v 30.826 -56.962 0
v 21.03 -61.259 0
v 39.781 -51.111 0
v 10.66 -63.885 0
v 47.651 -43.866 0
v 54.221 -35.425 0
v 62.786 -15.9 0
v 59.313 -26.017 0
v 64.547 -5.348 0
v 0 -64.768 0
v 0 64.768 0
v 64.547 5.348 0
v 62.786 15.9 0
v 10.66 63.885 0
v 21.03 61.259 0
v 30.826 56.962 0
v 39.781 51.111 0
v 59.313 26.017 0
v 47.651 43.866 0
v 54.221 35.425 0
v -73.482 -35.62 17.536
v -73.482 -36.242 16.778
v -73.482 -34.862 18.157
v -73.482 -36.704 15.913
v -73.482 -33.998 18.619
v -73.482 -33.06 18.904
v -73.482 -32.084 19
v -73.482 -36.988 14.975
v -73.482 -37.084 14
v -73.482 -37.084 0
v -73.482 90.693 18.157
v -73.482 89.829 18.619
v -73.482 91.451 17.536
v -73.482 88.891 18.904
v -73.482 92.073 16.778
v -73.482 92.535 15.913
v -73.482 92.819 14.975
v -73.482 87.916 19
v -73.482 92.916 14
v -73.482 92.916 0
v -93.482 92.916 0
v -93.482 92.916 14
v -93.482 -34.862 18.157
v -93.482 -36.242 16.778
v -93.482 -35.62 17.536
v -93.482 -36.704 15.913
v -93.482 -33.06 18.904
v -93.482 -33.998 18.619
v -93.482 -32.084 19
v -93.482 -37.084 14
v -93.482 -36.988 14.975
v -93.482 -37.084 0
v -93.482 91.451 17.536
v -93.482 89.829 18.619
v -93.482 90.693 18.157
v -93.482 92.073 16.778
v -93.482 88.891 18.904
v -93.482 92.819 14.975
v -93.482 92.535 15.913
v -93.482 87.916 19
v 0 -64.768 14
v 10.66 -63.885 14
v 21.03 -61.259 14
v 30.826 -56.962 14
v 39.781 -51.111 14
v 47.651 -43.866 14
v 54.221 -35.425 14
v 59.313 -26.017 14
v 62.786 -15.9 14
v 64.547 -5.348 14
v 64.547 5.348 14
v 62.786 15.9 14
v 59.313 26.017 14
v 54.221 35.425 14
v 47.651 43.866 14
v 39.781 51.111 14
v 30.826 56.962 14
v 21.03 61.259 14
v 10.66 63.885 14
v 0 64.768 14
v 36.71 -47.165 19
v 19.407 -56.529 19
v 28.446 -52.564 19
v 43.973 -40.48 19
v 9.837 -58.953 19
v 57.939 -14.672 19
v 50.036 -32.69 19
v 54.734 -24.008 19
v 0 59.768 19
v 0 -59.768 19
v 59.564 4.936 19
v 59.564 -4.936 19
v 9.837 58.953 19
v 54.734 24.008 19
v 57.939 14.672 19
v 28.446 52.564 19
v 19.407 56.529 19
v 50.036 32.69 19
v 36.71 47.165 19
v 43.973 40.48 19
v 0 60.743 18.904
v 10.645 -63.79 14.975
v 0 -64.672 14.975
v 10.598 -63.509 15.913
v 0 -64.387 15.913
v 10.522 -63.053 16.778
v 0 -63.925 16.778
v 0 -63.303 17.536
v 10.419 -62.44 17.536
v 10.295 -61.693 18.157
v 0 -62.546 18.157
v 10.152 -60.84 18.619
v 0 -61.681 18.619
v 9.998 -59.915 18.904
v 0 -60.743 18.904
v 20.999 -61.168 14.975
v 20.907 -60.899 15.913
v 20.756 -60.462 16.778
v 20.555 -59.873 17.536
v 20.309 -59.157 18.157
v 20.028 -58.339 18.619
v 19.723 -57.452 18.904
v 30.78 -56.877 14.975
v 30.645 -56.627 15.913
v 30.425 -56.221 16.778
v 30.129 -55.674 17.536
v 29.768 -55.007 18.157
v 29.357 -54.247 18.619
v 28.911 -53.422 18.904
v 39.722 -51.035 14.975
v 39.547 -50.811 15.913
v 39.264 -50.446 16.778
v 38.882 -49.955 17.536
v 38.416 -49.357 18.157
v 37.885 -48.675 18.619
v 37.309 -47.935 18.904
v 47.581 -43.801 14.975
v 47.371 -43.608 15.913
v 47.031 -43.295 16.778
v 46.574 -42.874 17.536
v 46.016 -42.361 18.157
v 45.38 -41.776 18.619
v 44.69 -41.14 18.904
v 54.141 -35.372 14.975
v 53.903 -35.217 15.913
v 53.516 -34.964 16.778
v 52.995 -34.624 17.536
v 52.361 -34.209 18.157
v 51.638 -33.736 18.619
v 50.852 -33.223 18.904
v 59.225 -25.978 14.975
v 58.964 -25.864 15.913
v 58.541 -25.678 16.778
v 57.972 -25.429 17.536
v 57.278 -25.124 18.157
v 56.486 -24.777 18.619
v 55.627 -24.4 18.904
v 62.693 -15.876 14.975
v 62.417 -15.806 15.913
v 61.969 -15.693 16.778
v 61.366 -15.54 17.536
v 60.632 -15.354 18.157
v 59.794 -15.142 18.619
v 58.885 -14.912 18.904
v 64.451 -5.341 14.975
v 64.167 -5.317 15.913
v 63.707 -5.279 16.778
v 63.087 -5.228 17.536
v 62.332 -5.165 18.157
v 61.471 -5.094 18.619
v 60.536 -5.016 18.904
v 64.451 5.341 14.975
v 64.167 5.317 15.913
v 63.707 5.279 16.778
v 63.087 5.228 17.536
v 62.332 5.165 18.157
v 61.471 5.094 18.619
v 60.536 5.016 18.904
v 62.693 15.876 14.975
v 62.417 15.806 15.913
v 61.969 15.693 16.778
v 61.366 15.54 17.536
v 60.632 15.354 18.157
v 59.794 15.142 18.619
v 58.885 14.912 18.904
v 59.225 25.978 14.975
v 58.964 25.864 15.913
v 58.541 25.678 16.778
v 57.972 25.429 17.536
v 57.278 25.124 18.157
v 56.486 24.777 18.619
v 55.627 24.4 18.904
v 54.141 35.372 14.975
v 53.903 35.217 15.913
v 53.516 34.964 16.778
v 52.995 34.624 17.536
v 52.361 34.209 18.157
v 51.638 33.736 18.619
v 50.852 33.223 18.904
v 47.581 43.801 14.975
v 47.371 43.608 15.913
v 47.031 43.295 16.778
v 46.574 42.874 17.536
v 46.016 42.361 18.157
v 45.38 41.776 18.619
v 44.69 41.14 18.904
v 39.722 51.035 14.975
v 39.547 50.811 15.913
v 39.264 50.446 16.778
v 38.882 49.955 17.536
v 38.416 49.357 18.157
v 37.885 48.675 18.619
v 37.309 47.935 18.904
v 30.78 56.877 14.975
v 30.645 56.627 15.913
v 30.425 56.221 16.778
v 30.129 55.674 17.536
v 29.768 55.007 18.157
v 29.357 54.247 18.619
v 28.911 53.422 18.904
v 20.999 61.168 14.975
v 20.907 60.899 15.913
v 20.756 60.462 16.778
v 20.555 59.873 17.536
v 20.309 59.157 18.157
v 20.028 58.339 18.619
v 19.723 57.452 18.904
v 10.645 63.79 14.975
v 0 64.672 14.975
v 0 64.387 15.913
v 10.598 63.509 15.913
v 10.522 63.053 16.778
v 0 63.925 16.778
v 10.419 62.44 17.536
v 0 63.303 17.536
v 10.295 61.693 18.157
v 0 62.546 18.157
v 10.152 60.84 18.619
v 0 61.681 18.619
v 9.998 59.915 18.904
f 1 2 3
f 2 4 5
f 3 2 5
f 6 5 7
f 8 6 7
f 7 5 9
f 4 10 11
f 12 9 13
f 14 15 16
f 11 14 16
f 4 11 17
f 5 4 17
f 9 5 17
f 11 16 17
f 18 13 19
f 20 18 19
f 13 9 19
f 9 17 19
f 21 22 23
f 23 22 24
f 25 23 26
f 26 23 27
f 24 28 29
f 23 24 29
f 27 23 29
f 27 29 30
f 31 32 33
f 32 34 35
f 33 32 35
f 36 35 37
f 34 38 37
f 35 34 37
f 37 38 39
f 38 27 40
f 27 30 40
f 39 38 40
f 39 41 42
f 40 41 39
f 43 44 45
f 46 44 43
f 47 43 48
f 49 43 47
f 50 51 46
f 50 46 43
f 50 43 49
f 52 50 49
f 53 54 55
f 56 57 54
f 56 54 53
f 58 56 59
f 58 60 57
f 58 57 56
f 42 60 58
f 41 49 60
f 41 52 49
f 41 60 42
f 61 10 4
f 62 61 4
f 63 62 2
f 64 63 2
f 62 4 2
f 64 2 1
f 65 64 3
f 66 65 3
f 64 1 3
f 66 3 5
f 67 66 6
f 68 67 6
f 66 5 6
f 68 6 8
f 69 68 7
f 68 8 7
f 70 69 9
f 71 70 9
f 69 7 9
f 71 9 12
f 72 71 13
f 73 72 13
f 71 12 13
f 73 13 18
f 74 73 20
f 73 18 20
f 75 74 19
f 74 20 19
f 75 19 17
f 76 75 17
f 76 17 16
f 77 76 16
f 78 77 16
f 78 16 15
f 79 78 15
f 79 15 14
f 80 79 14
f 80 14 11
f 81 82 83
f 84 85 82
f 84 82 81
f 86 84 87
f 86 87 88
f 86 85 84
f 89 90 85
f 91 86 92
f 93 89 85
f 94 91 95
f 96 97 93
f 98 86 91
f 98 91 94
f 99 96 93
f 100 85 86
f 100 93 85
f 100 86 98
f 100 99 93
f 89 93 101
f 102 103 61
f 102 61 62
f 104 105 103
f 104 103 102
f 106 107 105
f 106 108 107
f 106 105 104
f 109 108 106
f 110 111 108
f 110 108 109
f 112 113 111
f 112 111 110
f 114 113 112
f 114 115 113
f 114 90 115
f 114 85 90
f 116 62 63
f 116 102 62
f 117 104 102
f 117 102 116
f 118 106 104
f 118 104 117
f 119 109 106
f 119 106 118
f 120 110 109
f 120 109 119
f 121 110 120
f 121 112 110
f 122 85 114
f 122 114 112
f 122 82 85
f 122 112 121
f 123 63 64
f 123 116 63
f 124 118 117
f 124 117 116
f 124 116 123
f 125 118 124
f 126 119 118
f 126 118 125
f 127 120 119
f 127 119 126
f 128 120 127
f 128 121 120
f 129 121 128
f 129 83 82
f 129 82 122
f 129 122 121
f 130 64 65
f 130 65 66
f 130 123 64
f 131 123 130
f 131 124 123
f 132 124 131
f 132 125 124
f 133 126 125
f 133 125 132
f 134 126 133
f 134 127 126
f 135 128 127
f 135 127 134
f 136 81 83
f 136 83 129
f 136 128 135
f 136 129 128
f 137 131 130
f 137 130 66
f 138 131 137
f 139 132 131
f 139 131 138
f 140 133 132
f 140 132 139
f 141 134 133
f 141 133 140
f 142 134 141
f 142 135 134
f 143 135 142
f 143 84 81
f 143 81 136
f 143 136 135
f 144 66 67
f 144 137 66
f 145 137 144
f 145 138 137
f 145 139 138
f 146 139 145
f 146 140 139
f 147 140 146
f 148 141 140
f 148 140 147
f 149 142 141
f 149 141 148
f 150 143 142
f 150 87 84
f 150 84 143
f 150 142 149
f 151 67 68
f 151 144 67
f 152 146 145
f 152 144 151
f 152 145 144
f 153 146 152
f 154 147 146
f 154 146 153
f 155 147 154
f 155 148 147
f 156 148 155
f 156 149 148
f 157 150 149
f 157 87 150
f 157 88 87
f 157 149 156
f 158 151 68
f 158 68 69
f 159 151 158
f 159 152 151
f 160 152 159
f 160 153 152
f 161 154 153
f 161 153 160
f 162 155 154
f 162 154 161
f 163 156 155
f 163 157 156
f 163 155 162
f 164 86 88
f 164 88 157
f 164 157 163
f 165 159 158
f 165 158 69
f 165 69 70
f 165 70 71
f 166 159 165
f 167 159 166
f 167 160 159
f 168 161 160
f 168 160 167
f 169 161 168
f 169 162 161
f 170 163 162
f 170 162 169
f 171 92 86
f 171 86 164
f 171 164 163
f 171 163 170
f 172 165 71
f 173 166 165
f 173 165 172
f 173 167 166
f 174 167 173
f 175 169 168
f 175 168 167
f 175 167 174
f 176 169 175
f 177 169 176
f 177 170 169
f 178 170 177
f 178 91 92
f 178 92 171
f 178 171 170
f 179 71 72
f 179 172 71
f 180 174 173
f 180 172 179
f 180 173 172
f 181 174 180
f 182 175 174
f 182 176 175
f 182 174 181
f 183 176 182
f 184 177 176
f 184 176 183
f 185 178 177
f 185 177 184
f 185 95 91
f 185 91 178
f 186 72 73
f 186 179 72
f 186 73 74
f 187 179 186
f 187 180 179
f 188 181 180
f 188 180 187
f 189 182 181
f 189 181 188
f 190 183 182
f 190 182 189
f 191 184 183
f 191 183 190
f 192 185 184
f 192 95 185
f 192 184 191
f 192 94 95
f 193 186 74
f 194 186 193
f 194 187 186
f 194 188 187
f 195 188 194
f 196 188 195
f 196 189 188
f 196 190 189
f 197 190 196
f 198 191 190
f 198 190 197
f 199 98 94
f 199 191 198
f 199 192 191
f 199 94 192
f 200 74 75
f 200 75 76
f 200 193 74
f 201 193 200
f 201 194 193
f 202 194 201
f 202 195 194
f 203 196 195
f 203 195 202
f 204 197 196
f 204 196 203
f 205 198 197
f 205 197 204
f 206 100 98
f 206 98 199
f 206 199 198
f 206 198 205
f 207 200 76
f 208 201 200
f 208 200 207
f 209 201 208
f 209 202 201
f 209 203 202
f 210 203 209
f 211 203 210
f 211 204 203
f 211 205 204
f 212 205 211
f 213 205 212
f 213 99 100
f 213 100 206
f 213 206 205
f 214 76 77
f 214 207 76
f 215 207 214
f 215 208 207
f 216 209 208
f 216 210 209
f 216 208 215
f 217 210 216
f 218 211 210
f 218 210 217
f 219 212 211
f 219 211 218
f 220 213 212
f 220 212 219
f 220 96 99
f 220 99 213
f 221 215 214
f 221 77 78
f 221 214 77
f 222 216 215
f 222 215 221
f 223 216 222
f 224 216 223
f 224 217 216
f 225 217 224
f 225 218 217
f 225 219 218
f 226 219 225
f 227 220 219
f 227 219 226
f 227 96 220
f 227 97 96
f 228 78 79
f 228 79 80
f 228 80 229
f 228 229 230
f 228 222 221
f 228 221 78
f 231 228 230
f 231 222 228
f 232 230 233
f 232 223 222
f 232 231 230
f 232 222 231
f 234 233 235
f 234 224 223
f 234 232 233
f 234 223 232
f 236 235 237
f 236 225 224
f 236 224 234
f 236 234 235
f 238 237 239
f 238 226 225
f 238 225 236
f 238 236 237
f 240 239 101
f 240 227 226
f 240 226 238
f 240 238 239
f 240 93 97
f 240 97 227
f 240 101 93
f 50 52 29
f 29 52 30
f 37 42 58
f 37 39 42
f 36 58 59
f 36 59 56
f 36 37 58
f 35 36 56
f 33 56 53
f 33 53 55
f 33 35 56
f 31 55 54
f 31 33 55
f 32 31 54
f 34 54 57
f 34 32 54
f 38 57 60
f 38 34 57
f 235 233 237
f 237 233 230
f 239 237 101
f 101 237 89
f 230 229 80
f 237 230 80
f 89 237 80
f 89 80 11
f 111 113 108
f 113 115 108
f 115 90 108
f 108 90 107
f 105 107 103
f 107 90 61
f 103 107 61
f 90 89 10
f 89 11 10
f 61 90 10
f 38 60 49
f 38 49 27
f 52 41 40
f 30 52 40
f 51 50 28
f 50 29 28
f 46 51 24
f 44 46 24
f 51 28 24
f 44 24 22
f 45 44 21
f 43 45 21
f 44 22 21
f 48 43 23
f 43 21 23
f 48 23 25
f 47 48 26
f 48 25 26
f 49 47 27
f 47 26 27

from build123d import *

# Parameters (mm, degrees)
F1_DEPTH = 19
F2_R     = 5
F3_W     = 20
F3_H     = 130
F4_DEPTH = 19
F5_R     = 5


with BuildPart() as f1:
    # F0 (on Top) → F1 (new body)
    with BuildSketch(Plane.XY):
        with BuildLine():
            Line((0, 64.767876), (0, -64.767876))
            ThreePointArc((0, -64.767876), (64.767876, 0), (0, 64.767876))
        make_face()
    extrude(amount=F1_DEPTH)

    # F2
    f2_edges = [f1.edges().sort_by_distance(p)[0] for p in [
        (64.767876, 0, 19),
    ]]
    fillet(f2_edges, radius=F2_R)


with BuildPart() as f4:
    # F3 (on Top) → F4 (new body)
    with BuildSketch(Plane.XY):
        with Locations((-83.482434, 27.915571)):
            Rectangle(F3_W, F3_H)
    extrude(amount=F4_DEPTH)

    # F5
    f5_edges = [f4.edges().sort_by_distance(p)[0] for p in [
        (-83.482434, -37.084429, 19),
        (-83.482434, 92.915571, 19),
    ]]
    fillet(f5_edges, radius=F5_R)


solid = Compound([f1.part, f4.part])
